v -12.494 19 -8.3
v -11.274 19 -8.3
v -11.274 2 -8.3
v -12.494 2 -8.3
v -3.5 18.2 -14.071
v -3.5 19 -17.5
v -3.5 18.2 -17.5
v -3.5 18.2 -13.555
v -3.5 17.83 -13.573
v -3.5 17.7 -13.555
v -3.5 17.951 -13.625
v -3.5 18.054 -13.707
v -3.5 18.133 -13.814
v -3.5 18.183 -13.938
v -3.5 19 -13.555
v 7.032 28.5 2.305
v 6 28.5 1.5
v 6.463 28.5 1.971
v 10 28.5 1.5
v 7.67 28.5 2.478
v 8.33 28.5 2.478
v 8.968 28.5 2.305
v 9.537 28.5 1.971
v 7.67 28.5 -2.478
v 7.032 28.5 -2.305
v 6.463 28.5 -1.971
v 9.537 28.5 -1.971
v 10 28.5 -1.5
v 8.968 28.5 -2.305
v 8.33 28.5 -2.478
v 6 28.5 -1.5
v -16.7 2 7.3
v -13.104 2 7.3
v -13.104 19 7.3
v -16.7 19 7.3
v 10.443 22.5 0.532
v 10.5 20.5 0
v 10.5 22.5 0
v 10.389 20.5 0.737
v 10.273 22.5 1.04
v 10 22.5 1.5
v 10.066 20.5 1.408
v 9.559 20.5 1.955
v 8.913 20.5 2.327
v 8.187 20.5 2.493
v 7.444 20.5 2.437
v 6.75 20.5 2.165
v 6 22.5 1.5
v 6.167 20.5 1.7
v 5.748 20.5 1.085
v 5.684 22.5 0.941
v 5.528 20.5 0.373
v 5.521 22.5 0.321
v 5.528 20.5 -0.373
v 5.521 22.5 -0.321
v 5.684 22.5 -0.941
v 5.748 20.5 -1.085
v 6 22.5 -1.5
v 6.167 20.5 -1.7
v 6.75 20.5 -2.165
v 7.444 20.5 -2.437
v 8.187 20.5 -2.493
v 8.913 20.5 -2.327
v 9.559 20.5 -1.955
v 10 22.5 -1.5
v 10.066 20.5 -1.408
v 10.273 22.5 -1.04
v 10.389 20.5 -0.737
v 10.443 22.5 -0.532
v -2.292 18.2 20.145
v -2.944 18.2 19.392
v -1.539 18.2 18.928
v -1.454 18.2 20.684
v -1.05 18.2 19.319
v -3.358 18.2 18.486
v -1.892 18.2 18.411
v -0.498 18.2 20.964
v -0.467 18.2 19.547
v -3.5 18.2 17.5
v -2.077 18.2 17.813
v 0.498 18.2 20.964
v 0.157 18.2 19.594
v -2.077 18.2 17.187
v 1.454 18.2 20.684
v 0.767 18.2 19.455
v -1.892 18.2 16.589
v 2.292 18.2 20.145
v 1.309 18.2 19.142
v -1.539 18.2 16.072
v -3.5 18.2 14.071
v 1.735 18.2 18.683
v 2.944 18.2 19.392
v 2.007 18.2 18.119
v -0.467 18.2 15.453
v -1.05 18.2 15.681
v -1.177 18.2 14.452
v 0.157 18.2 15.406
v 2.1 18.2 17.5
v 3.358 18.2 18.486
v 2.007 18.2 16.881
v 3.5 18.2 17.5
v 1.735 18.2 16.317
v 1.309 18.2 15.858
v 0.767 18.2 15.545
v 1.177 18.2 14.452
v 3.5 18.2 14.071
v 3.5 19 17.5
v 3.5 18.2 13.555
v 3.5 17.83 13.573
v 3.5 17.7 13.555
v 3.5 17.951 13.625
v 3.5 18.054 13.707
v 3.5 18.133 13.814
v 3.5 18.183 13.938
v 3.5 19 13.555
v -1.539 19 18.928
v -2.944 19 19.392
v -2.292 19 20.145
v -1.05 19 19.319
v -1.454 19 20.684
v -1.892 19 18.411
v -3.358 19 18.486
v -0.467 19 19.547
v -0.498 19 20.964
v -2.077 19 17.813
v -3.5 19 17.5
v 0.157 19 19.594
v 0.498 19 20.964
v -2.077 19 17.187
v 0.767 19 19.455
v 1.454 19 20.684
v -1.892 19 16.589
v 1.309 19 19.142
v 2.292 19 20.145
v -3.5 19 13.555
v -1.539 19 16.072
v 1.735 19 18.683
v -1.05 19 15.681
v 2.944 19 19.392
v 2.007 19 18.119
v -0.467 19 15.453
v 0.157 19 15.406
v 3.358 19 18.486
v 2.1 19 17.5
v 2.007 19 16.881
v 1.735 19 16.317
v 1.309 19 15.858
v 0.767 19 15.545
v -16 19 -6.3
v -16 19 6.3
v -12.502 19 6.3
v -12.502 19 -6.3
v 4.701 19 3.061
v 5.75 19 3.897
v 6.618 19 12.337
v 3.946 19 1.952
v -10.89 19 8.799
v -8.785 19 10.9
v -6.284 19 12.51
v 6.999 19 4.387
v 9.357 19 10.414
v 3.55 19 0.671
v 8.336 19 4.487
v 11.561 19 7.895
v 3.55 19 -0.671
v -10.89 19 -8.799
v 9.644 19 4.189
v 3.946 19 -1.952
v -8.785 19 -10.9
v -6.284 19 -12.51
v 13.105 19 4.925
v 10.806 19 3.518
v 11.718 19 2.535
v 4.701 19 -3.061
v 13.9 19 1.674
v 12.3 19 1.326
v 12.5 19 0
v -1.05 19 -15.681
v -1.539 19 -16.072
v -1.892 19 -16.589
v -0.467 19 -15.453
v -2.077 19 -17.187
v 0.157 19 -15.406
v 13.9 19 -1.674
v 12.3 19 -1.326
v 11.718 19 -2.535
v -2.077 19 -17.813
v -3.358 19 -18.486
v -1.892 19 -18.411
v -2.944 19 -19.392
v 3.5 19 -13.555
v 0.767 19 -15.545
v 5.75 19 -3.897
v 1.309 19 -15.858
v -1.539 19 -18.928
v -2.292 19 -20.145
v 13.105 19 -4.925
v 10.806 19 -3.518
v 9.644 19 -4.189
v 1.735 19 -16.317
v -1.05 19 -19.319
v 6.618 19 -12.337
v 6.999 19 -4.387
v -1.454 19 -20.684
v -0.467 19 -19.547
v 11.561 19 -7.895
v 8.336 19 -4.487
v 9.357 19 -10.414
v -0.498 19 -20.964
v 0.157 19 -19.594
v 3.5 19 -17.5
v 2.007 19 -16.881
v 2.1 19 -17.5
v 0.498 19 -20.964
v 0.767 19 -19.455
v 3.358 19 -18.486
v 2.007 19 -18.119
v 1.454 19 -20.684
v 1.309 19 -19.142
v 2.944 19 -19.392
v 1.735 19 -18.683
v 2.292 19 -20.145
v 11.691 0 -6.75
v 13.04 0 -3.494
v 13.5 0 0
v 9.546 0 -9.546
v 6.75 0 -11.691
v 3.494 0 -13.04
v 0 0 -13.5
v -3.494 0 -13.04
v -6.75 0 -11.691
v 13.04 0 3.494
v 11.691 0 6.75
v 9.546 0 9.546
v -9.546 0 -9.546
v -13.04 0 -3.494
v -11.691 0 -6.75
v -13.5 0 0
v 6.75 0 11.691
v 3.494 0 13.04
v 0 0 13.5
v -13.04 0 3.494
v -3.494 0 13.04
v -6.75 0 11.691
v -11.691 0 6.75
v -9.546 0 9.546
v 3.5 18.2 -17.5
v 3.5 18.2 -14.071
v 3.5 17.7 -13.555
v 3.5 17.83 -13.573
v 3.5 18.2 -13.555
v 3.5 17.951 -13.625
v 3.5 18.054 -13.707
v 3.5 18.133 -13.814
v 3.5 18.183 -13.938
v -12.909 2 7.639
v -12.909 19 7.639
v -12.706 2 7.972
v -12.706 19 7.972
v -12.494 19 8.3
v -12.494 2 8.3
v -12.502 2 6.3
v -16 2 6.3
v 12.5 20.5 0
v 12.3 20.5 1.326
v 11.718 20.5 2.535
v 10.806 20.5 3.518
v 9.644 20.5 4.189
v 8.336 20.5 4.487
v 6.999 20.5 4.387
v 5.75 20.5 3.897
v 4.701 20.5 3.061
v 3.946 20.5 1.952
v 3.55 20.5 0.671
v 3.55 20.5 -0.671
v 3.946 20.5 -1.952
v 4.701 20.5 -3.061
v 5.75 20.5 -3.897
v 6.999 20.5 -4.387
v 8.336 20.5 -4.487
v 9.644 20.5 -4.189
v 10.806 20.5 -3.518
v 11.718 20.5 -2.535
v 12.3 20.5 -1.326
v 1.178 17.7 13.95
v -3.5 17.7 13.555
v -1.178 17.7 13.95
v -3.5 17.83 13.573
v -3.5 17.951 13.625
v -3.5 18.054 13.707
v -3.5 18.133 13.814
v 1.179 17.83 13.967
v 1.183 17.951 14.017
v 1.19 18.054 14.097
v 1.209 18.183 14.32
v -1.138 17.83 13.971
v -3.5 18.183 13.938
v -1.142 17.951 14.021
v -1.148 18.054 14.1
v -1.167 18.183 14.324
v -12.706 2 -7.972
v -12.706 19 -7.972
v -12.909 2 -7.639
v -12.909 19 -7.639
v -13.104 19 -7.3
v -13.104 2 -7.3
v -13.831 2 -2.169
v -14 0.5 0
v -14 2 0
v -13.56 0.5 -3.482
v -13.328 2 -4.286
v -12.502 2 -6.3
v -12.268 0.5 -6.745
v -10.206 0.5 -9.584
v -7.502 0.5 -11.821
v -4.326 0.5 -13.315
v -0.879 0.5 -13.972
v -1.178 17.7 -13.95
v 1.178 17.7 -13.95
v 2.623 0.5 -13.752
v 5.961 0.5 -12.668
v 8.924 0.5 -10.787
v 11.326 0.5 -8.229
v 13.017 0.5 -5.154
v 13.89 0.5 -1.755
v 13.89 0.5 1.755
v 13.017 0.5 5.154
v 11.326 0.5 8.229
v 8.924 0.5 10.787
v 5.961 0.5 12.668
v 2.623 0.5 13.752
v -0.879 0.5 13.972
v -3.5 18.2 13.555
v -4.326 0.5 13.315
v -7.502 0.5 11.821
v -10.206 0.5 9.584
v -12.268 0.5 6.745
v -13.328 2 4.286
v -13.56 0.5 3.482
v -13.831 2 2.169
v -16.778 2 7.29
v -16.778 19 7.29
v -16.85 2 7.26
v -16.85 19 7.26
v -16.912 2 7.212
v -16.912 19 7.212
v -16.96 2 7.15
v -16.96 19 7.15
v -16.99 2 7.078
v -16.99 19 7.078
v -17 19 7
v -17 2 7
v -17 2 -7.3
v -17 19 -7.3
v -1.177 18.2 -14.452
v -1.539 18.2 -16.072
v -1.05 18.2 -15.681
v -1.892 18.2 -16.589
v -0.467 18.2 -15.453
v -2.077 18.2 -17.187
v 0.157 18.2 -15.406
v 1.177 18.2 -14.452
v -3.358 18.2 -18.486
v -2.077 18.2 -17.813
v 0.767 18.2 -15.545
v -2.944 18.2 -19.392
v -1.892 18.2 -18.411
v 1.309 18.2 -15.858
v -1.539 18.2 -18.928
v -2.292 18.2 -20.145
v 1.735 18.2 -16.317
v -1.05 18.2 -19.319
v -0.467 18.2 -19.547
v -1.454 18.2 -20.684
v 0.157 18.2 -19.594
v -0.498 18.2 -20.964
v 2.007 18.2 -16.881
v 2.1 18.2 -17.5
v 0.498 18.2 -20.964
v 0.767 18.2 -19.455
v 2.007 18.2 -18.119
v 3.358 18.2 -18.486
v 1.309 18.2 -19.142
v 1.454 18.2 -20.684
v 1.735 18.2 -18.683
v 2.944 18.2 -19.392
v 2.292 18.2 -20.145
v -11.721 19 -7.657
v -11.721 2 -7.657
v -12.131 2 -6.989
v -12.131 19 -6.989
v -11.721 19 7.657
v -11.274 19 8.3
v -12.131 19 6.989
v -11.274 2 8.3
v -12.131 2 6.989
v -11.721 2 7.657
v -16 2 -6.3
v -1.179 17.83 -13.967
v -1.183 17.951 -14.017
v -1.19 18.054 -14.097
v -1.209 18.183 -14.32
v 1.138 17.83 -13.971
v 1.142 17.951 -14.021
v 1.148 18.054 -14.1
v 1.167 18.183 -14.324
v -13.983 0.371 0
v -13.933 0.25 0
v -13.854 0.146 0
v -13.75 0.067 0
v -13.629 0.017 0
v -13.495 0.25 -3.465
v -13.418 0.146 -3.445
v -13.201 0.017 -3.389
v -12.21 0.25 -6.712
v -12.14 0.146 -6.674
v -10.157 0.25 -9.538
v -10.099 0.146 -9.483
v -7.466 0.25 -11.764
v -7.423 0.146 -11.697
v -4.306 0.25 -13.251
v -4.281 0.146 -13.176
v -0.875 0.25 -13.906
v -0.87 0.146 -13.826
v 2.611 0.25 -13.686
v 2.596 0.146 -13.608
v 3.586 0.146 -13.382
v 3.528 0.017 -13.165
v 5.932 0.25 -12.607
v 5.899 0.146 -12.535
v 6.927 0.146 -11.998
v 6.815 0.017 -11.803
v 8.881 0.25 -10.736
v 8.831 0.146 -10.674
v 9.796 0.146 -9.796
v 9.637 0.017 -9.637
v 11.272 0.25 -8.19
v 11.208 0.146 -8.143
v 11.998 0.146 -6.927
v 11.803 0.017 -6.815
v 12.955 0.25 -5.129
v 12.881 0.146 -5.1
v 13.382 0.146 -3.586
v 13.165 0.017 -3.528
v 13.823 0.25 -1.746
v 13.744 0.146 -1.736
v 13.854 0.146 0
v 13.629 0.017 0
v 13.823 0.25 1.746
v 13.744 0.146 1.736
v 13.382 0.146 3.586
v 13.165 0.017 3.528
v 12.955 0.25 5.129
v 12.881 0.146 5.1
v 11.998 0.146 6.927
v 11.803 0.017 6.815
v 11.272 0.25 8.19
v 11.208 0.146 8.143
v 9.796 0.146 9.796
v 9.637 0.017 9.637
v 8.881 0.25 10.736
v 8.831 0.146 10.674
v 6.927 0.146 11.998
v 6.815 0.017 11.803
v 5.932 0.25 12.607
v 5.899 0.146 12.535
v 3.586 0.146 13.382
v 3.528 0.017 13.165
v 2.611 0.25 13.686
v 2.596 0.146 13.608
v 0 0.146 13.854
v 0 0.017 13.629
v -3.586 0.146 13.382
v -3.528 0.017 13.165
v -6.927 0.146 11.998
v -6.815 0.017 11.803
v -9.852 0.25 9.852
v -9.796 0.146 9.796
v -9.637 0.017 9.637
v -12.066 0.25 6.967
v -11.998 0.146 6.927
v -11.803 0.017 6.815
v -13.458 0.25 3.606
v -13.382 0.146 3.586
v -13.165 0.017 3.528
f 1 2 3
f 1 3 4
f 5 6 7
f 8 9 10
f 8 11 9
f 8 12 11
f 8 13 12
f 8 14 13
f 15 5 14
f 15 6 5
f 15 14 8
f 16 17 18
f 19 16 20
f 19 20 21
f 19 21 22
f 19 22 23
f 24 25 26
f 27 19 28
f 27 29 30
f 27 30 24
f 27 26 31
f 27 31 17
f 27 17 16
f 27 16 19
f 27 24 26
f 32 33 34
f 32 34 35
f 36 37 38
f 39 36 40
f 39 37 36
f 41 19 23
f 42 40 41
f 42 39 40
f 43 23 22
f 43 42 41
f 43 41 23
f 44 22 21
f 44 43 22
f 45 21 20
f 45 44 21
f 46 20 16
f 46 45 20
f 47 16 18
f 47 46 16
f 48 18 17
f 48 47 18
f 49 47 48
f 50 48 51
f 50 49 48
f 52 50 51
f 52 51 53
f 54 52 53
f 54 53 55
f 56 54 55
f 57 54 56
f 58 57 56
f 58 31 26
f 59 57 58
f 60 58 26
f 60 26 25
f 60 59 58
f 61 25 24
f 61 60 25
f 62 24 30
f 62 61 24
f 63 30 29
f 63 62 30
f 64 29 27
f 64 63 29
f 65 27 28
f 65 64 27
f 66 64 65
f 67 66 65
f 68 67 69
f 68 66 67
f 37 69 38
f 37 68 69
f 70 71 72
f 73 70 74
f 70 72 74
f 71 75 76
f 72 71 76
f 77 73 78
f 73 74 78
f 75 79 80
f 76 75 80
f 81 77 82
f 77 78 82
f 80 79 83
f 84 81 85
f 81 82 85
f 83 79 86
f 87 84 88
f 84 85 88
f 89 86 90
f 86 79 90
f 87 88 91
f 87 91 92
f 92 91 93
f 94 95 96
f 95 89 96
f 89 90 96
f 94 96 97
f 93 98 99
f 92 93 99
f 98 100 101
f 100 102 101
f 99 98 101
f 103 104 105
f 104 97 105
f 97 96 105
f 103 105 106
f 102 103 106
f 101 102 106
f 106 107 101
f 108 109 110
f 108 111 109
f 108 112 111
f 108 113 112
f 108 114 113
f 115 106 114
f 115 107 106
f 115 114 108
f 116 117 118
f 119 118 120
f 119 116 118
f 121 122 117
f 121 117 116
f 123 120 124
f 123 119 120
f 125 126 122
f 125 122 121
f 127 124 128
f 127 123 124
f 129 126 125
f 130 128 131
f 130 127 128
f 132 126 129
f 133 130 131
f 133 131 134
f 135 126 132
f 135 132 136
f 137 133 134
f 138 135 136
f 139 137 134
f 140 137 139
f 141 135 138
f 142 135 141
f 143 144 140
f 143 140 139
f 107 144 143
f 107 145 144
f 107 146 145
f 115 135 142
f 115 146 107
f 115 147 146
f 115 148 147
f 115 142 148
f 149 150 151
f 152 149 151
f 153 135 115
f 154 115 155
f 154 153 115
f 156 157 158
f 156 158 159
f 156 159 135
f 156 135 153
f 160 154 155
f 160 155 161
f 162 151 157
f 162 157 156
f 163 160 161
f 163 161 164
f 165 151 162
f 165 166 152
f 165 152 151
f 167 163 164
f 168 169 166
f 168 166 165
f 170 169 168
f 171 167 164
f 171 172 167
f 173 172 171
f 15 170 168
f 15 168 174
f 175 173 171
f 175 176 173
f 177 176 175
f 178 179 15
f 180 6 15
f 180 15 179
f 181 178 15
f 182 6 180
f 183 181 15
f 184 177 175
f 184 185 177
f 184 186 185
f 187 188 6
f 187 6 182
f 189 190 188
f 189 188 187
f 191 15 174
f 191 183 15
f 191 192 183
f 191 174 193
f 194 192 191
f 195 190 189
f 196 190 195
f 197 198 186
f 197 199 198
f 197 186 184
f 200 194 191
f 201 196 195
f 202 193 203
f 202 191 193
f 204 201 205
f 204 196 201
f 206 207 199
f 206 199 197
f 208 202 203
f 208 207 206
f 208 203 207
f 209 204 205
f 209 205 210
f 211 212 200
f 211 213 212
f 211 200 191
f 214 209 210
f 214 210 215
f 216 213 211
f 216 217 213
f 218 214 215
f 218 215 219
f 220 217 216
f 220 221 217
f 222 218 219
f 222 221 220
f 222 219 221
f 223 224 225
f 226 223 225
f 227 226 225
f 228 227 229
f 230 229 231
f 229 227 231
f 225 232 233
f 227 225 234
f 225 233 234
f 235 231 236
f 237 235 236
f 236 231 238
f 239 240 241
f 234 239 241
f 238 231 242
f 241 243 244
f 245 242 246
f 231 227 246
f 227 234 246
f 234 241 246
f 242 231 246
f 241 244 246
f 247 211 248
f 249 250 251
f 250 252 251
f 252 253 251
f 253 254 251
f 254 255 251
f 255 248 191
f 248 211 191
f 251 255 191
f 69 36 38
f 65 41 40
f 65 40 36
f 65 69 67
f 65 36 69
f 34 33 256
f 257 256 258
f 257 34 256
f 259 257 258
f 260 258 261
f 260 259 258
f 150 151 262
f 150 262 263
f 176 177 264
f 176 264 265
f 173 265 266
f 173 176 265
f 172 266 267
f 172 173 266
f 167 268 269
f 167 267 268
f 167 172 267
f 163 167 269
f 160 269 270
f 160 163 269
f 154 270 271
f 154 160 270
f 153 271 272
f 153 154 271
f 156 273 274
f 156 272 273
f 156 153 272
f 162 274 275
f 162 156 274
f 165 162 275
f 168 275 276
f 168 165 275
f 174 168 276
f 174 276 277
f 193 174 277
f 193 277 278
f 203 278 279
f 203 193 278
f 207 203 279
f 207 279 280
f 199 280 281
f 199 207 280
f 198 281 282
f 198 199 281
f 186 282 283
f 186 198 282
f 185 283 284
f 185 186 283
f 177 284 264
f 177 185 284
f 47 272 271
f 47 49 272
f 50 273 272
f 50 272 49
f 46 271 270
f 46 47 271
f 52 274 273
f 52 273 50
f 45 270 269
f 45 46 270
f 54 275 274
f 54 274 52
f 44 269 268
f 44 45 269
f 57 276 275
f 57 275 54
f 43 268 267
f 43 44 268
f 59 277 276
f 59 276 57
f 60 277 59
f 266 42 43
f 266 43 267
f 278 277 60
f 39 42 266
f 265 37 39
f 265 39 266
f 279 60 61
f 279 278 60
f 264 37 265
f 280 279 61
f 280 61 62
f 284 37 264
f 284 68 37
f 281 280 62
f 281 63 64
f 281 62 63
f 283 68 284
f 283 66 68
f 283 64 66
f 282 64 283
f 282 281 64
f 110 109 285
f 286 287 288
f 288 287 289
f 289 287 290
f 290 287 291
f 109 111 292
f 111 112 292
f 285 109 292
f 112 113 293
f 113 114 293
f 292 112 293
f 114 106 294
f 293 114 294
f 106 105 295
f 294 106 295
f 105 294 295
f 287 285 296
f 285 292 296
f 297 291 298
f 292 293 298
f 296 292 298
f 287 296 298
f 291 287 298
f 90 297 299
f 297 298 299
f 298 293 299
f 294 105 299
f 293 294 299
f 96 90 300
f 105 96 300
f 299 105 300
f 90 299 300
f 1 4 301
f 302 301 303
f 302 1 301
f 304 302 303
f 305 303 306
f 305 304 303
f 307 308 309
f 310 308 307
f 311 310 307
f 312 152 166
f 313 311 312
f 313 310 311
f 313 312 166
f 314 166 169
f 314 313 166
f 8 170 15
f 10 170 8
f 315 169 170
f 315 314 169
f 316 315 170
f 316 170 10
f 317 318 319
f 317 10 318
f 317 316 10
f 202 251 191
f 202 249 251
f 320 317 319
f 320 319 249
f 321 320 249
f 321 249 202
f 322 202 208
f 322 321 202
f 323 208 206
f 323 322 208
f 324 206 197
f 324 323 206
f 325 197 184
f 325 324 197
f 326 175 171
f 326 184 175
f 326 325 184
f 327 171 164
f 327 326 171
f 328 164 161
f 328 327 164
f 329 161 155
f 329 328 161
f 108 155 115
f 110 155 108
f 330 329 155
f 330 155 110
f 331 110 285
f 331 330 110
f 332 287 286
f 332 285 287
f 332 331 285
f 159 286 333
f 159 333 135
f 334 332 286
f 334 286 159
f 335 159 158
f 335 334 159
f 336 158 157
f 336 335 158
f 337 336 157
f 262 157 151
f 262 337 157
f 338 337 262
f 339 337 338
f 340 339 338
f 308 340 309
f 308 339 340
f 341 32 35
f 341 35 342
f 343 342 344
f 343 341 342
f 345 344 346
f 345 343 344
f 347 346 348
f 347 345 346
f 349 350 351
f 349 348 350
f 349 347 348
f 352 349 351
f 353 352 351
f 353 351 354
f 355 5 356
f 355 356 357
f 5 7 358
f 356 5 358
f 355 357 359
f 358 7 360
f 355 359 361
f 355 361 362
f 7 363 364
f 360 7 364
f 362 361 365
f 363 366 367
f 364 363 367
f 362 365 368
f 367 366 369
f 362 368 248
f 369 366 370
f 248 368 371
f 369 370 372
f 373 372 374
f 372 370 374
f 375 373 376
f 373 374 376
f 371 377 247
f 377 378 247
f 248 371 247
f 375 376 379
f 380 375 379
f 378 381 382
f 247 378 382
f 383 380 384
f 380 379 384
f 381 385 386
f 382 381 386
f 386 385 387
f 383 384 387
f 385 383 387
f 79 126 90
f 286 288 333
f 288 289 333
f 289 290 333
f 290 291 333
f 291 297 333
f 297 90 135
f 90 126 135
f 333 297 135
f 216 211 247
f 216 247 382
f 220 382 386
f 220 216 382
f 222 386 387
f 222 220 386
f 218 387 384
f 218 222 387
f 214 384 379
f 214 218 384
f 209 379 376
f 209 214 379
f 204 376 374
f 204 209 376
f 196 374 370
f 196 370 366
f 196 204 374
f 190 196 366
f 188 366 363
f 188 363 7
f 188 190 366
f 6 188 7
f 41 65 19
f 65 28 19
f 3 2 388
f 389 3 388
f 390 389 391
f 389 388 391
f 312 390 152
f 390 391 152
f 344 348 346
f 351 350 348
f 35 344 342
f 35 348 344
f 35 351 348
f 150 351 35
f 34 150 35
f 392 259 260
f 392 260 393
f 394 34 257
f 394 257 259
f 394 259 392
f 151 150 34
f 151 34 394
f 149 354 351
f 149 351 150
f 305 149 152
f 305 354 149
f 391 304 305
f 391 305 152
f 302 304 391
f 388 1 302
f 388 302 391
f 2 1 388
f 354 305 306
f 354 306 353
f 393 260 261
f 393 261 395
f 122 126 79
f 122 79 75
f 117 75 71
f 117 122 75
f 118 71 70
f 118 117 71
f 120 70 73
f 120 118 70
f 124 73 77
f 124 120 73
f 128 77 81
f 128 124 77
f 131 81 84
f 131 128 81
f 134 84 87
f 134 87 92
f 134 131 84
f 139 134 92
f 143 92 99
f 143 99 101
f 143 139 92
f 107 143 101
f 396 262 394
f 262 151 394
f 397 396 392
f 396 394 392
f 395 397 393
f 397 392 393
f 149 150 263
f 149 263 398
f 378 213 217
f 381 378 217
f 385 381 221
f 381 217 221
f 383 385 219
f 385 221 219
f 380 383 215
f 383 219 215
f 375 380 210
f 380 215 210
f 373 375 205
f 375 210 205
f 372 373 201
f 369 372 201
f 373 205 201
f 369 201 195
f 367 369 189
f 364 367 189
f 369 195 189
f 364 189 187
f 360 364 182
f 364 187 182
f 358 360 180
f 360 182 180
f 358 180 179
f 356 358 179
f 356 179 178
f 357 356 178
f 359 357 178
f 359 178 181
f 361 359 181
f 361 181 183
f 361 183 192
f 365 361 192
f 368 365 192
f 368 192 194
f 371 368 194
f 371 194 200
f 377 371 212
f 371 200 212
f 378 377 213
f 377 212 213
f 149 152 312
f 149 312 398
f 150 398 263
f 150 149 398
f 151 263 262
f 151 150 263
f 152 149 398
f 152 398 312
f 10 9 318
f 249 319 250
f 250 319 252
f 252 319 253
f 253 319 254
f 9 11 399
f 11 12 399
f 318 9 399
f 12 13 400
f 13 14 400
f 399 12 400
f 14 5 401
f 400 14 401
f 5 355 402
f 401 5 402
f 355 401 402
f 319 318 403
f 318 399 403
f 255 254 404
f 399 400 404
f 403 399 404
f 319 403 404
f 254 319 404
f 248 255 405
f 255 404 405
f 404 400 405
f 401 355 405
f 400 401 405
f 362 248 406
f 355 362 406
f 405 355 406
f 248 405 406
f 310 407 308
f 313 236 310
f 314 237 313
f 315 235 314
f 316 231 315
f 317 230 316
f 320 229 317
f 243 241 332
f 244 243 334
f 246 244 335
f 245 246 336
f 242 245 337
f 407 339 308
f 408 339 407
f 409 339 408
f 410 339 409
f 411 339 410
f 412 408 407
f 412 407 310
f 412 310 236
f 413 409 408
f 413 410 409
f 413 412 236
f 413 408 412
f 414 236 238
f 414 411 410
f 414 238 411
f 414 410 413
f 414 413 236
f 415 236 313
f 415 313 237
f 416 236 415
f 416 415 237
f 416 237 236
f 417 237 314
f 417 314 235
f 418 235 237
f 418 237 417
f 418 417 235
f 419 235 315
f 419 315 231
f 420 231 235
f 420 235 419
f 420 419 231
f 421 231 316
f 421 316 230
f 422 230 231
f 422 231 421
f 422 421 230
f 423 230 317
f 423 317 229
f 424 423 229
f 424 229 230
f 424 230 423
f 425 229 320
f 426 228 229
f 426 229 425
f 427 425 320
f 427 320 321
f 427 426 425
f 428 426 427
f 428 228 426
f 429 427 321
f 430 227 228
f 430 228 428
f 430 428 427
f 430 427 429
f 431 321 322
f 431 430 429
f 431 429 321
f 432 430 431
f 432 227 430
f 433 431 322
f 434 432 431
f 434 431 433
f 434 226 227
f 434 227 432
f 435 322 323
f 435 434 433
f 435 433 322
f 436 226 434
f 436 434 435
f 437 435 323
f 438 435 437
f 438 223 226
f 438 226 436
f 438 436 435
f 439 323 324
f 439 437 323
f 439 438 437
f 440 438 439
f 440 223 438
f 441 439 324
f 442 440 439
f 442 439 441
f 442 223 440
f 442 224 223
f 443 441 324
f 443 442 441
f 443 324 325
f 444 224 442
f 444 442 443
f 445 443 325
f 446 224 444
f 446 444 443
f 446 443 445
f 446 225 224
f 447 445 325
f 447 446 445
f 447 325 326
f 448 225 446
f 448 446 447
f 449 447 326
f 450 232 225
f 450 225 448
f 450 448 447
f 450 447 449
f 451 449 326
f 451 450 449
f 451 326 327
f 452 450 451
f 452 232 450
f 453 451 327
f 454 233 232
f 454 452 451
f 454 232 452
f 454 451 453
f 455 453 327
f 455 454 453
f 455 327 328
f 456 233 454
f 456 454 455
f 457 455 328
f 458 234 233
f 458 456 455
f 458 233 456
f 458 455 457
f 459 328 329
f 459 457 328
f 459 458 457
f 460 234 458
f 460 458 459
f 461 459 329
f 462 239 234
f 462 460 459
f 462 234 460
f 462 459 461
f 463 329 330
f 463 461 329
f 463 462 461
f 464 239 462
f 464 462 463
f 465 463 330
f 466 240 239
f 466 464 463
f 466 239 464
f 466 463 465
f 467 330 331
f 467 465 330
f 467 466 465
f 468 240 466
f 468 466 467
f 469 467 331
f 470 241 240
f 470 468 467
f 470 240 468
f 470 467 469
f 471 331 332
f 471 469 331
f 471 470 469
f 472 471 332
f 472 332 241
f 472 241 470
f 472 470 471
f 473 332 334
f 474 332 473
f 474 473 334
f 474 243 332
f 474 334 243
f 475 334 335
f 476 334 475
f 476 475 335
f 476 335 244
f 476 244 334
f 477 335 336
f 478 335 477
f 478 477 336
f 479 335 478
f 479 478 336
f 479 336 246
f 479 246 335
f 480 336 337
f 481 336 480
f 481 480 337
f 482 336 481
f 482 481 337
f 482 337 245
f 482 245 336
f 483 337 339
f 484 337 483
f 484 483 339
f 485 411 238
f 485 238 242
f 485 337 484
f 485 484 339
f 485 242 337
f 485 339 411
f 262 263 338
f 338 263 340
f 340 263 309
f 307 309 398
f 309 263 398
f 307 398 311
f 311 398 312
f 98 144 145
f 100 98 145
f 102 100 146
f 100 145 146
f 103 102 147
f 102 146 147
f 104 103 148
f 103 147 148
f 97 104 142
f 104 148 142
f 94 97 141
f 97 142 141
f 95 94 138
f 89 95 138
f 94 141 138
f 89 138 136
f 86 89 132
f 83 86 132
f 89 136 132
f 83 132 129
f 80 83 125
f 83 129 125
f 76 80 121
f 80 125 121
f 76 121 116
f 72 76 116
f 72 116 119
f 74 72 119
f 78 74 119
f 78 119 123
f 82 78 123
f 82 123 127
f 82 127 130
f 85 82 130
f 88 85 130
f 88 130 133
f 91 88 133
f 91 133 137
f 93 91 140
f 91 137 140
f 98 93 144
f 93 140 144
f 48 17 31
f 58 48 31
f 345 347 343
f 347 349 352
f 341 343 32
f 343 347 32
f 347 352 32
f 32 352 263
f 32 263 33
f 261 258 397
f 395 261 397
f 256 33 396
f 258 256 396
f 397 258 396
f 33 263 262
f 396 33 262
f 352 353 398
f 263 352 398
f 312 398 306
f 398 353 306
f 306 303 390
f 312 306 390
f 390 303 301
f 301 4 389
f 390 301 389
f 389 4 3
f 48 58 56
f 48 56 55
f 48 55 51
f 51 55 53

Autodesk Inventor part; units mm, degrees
ref_plane "YZ Plane" through (0, 0, 0) normal (1, 0, 0) x (0, 1, 0)
ref_plane "XZ Plane" through (0, 0, 0) normal (0, 1, 0) x (-1, 0, 0)
ref_plane "XY Plane" through (0, 0, 0) normal (0, 0, 1) x (1, 0, 0)
sketch "Эскиз1" plane through (0, 0, 0) normal (0, 1, 0) x (-1, 0, 0)
  circle A0 centre (0, 0) radius 14
  dimension "d0" = 28
extrude "Выдавливание1" add sketch "Эскиз1" along normal blind 19
sketch "Эскиз2" plane through (0, 19, 0) normal (0, 1, 0) x (1, 0, 0)
  circle A0 centre (8, 0) radius 4.5
  point P0 (0, 0)
  dimension "d3" = 9
  dimension "d4" = 8
extrude "Выдавливание2" add sketch "Эскиз2" along normal blind 1.5
sketch "Эскиз3" plane through (8, 20.5, 0) normal (0, 1, 0) x (1, 0, 0)
  circle A0 centre (0, 0) radius 2.5
  point P0 (-8, 0)
  dimension "d7" = 5
extrude "Выдавливание3" add sketch "Эскиз3" along normal blind 8
sketch "Эскиз4" plane through (8, 28.5, 0) normal (0, 1, 0) x (1, 0, 0)
  circle A0 centre (0, 0) radius 2.5 projected
  line L0 (2, 1.5) -> (2, -1.5)
  line L1 (-2, -1.5) -> (-2, 1.5)
  point P0 (-8, 0)
  dimension "d12" = 3
  dimension "d13" = 3
extrude "Выдавливание4" cut sketch "Эскиз4" against normal blind 6 contours A0 L0 | L1 A0
sketch "Эскиз5" plane through (0, 19, 0) normal (0, 1, 0) x (1, 0, 0)
  arc A0 (-3.5, -17.5) -> (3.5, -17.5) centre (0, -17.5) ccw
  arc A1 (3.5, 17.5) -> (-3.5, 17.5) centre (0, 17.5) ccw
  circle A2 centre (0, 0) radius 14 projected
  line L0 (-3.5, -17.5) -> (-3.5, -13.5554)
  line L1 (3.5, 17.5) -> (3.5, 13.5554)
  line L2 (-3.5, 17.5) -> (-3.5, 13.5554)
  line L3 (3.5, -17.5) -> (3.5, -13.5554)
  line L4 (0, 29.4009) -> (0, -29.4054) construction
  circle A3 centre (8, 0) radius 4.5 projected
  dimension "d16" = 7
  dimension "d17" = 17.5
  dimension "d18" = 7
  dimension "d19" = 17.5
  dimension "d41" = 8
extrude "Выдавливание5" add sketch "Эскиз5" against normal blind 0.8 contours L0 A2 L3 A0 | L2 A1 L1 A2
sketch "Эскиз6" plane through (0, 19, 0) normal (0, 1, 0) x (1, 0, 0)
  circle A0 centre (0, 17.5) radius 2.1
  circle A1 centre (0, -17.5) radius 2.1
  point P0 (0, 0)
  dimension "d22" = 4.2
  dimension "d23" = 4.2
  dimension "d24" = 17.5
  dimension "d25" = 17.5
extrude "Выдавливание6" cut sketch "Эскиз6" against normal blind 0.8
fillet "Сопряжение1" radius 0.5 1 edges at (14, 0, 0)
fillet "Сопряжение2" radius 0.5 1 edges at (0, 18.2, -14)
fillet "Сопряжение3" radius 0.5 1 edges at (0, 18.2, 14)
sketch "Эскиз7" plane through (0, 19, 0) normal (0, 1, 0) x (1, 0, 0)
  line L0 (-17, -7.3) -> (-17, 7.3)
  line L1 (0, 0) -> (-17, 0) construction
  line L2 (-13.1038, 7.3) -> (-17, 7.3)
  line L3 (-13.1038, -7.3) -> (-17, -7.3)
  arc A0 (-3.5, 13.5554) -> (-3.5, -13.5554) centre (0, 0) ccw projected
  line L4 (-12.5024, -6.3) -> (-16, -6.3)
  line L5 (-16, -6.3) -> (-16, 6.3)
  line L6 (-16, 6.3) -> (-12.5024, 6.3)
  line L7 (-11.2743, 8.3) -> (-12.4944, 8.3)
  line L8 (-12.4944, -8.3) -> (-11.2743, -8.3)
  arc A1 (-12.4944, 8.3) -> (-13.1038, 7.3) centre (0, 0) ccw
  arc A2 (-13.1038, -7.3) -> (-12.4944, -8.3) centre (0, 0) ccw
  point P0 (0, 7.4186)
  point P1 (0, -7.4186)
  point P2 (-11.9461, 7.3)
  point P3 (-11.9461, -7.3)
  dimension "d31" = 17
  dimension "d32" = 14.6
  dimension "d33" = 1
  dimension "d35" = 1
extrude "Выдавливание7" add sketch "Эскиз7" against normal blind 17 separate body contours L0 L2 A1 L7 A0 L6 L5 L4 L8 A2 L3
sketch "Эскиз9" plane through (0, 19, 0) normal (0, 1, 0) x (1, 0, 0)
  arc A0 (-3.5, 13.5554) -> (-3.5, -13.5554) centre (0, 0) ccw projected
  line L0 (-3.5, 13.5554) -> (-3.5, 17.5) projected
  arc A1 (3.5, 17.5) -> (-3.5, 17.5) centre (0, 17.5) ccw projected
  line L1 (3.5, 17.5) -> (3.5, 13.5554) projected
  arc A2 (3.5, -13.5554) -> (3.5, 13.5554) centre (0, 0) ccw projected
  line L2 (3.5, -13.5554) -> (3.5, -17.5) projected
  arc A3 (-3.5, -17.5) -> (3.5, -17.5) centre (0, -17.5) ccw projected
  line L3 (-3.5, -17.5) -> (-3.5, -13.5554) projected
  circle A4 centre (0, 17.5) radius 2.1 projected
  circle A5 centre (0, -17.5) radius 2.1 projected
  circle A6 centre (8, 0) radius 4.5 projected
  arc A7 (-13.1038, -7.3) -> (-12.4944, -8.3) centre (0, 0) ccw projected
  line L4 (-13.1038, -7.3) -> (-17, -7.3) projected
  line L5 (-17, -7.3) -> (-17, 7.3) projected
  line L6 (-17, 7.3) -> (-13.1038, 7.3) projected
  arc A8 (-12.4944, 8.3) -> (-13.1038, 7.3) centre (0, 0) ccw projected
  line L7 (-12.4944, 8.3) -> (-11.2743, 8.3) projected
  arc A9 (-11.2743, 8.3) -> (-12.5024, 6.3) centre (0, 0) ccw projected
  line L8 (-12.5024, 6.3) -> (-16, 6.3) projected
  line L9 (-16, 6.3) -> (-16, -6.3) projected
  line L10 (-16, -6.3) -> (-12.5024, -6.3) projected
  arc A10 (-12.5024, -6.3) -> (-11.2743, -8.3) centre (0, 0) ccw projected
  line L11 (-11.2743, -8.3) -> (-12.4944, -8.3) projected
  arc A11 (-3.5, 13.5554) -> (-3.5, -13.5554) centre (0, 0) ccw projected
  line L12 (-3.5, 13.5554) -> (-3.5, 17.5) projected
  line L13 (-3.5, -17.5) -> (-3.5, -13.5554) projected
  circle A12 centre (0, 17.5) radius 2.1 projected
  circle A13 centre (0, -17.5) radius 2.1 projected
  circle A14 centre (8, 0) radius 4.5 projected
  arc A15 (-13.1038, -7.3) -> (-12.4944, -8.3) centre (0, 0) ccw projected
  line L14 (-13.1038, -7.3) -> (-17, -7.3) projected
  line L15 (-17, -7.3) -> (-17, 7.3) projected
  line L16 (-17, 7.3) -> (-13.1038, 7.3) projected
  arc A16 (-12.4944, 8.3) -> (-13.1038, 7.3) centre (0, 0) ccw projected
  line L17 (-12.4944, 8.3) -> (-11.2743, 8.3) projected
  arc A17 (-11.2743, 8.3) -> (-12.5024, 6.3) centre (0, 0) ccw projected
  line L18 (-12.5024, 6.3) -> (-16, 6.3) projected
  line L19 (-16, 6.3) -> (-16, -6.3) projected
  line L20 (-16, -6.3) -> (-12.5024, -6.3) projected
  arc A18 (-12.5024, -6.3) -> (-11.2743, -8.3) centre (0, 0) ccw projected
  line L21 (-11.2743, -8.3) -> (-12.4944, -8.3) projected
  arc A19 (-3.5, 13.5554) -> (-3.5, -13.5554) centre (0, 0) ccw projected
  line L22 (-3.5, 13.5554) -> (-3.5, 17.5) projected
  line L23 (-3.5, -17.5) -> (-3.5, -13.5554) projected
  circle A20 centre (0, 17.5) radius 2.1 projected
  circle A21 centre (0, -17.5) radius 2.1 projected
  circle A22 centre (8, 0) radius 4.5 projected
  arc A23 (-13.1038, -7.3) -> (-12.4944, -8.3) centre (0, 0) ccw projected
  line L24 (-13.1038, -7.3) -> (-17, -7.3) projected
  line L25 (-17, -7.3) -> (-17, 7.3) projected
  line L26 (-17, 7.3) -> (-13.1038, 7.3) projected
  arc A24 (-12.4944, 8.3) -> (-13.1038, 7.3) centre (0, 0) ccw projected
  line L27 (-12.4944, 8.3) -> (-11.2743, 8.3) projected
  arc A25 (-11.2743, 8.3) -> (-12.5024, 6.3) centre (0, 0) ccw projected
  line L28 (-12.5024, 6.3) -> (-16, 6.3) projected
  line L29 (-16, 6.3) -> (-16, -6.3) projected
  line L30 (-16, -6.3) -> (-12.5024, -6.3) projected
  arc A26 (-12.5024, -6.3) -> (-11.2743, -8.3) centre (0, 0) ccw projected
  line L31 (-11.2743, -8.3) -> (-12.4944, -8.3) projected
  arc A27 (-3.5, 13.5554) -> (-3.5, -13.5554) centre (0, 0) ccw projected
  line L32 (-3.5, 13.5554) -> (-3.5, 17.5) projected
  line L33 (-3.5, -17.5) -> (-3.5, -13.5554) projected
  circle A28 centre (0, 17.5) radius 2.1 projected
  circle A29 centre (0, -17.5) radius 2.1 projected
  circle A30 centre (8, 0) radius 4.5 projected
  arc A31 (-13.1038, -7.3) -> (-12.4944, -8.3) centre (0, 0) ccw projected
  line L34 (-13.1038, -7.3) -> (-17, -7.3) projected
  line L35 (-17, -7.3) -> (-17, 7.3) projected
  line L36 (-17, 7.3) -> (-13.1038, 7.3) projected
  arc A32 (-12.4944, 8.3) -> (-13.1038, 7.3) centre (0, 0) ccw projected
  line L37 (-12.4944, 8.3) -> (-11.2743, 8.3) projected
  arc A33 (-11.2743, 8.3) -> (-12.5024, 6.3) centre (0, 0) ccw projected
  line L38 (-12.5024, 6.3) -> (-16, 6.3) projected
  line L39 (-16, 6.3) -> (-16, -6.3) projected
  line L40 (-16, -6.3) -> (-12.5024, -6.3) projected
  arc A34 (-12.5024, -6.3) -> (-11.2743, -8.3) centre (0, 0) ccw projected
  line L41 (-11.2743, -8.3) -> (-12.4944, -8.3) projected
  arc A35 (-3.5, 13.5554) -> (-3.5, -13.5554) centre (0, 0) ccw projected
  line L42 (-16, 6.3) -> (-12.5024, 6.3) projected
  line L43 (-16, -6.3) -> (-16, 6.3) projected
  circle A36 centre (0, 17.5) radius 2.1 projected
  circle A37 centre (0, -17.5) radius 2.1 projected
  circle A38 centre (8, 0) radius 4.5 projected
  arc A39 (-3.5, 13.5554) -> (-3.5, -13.5554) centre (0, 0) ccw projected
  line L44 (-3.5, -13.5554) -> (-3.5, -17.5) projected
  arc A40 (-3.5, -17.5) -> (3.5, -17.5) centre (0, -17.5) ccw projected
  line L45 (3.5, -17.5) -> (3.5, -13.5554) projected
  arc A41 (3.5, -13.5554) -> (3.5, 13.5554) centre (0, 0) ccw projected
  line L46 (3.5, 13.5554) -> (3.5, 17.5) projected
  arc A42 (3.5, 17.5) -> (-3.5, 17.5) centre (0, 17.5) ccw projected
  line L47 (-3.5, 17.5) -> (-3.5, 13.5554) projected
  arc A43 (-3.5, 13.5554) -> (-3.5, -13.5554) centre (0, 0) ccw projected
  line L48 (-3.5, 13.5554) -> (-3.5, 17.5) projected
  line L49 (-3.5, -17.5) -> (-3.5, -13.5554) projected
  circle A44 centre (0, 17.5) radius 2.1 projected
  circle A45 centre (0, -17.5) radius 2.1 projected
  circle A46 centre (8, 0) radius 4.5 projected
  arc A47 (-13.1038, -7.3) -> (-12.4944, -8.3) centre (0, 0) ccw projected
  line L50 (-13.1038, -7.3) -> (-17, -7.3) projected
  line L51 (-17, -7.3) -> (-17, 7.3) projected
  line L52 (-17, 7.3) -> (-13.1038, 7.3) projected
  arc A48 (-12.4944, 8.3) -> (-13.1038, 7.3) centre (0, 0) ccw projected
  line L53 (-12.4944, 8.3) -> (-11.2743, 8.3) projected
  arc A49 (-11.2743, 8.3) -> (-12.5024, 6.3) centre (0, 0) ccw projected
  line L54 (-12.5024, 6.3) -> (-16, 6.3) projected
  line L55 (-16, 6.3) -> (-16, -6.3) projected
  line L56 (-16, -6.3) -> (-12.5024, -6.3) projected
  arc A50 (-12.5024, -6.3) -> (-11.2743, -8.3) centre (0, 0) ccw projected
  line L57 (-11.2743, -8.3) -> (-12.4944, -8.3) projected
  arc A51 (3.5, 17.5) -> (-3.5, 17.5) centre (0, 17.5) ccw projected
  line L58 (3.5, 17.5) -> (3.5, 13.5554) projected
  arc A52 (3.5, -13.5554) -> (3.5, 13.5554) centre (0, 0) ccw projected
  line L59 (3.5, -13.5554) -> (3.5, -17.5) projected
  arc A53 (-3.5, -17.5) -> (3.5, -17.5) centre (0, -17.5) ccw projected
  arc A54 (3.5, 17.5) -> (-3.5, 17.5) centre (0, 17.5) ccw projected
  line L60 (3.5, 17.5) -> (3.5, 13.5554) projected
  arc A55 (3.5, -13.5554) -> (3.5, 13.5554) centre (0, 0) ccw projected
  line L61 (3.5, -13.5554) -> (3.5, -17.5) projected
  arc A56 (-3.5, -17.5) -> (3.5, -17.5) centre (0, -17.5) ccw projected
  arc A57 (3.5, 17.5) -> (-3.5, 17.5) centre (0, 17.5) ccw projected
  line L62 (3.5, 17.5) -> (3.5, 13.5554) projected
  arc A58 (3.5, -13.5554) -> (3.5, 13.5554) centre (0, 0) ccw projected
  line L63 (3.5, -13.5554) -> (3.5, -17.5) projected
  arc A59 (-3.5, -17.5) -> (3.5, -17.5) centre (0, -17.5) ccw projected
  arc A60 (3.5, 17.5) -> (-3.5, 17.5) centre (0, 17.5) ccw projected
  line L64 (3.5, 17.5) -> (3.5, 13.5554) projected
  arc A61 (3.5, -13.5554) -> (3.5, 13.5554) centre (0, 0) ccw projected
  line L65 (3.5, -13.5554) -> (3.5, -17.5) projected
  arc A62 (-3.5, -17.5) -> (3.5, -17.5) centre (0, -17.5) ccw projected
extrude "Выдавливание8" add sketch "Эскиз9" against normal blind 17 contours A0 L10 L9 L8 bodies 1
fillet "Сопряжение4" radius 0.3 1 edges at (-17, 10.5, 7.3)
properties part number "Stepper 28BYJ-48"
